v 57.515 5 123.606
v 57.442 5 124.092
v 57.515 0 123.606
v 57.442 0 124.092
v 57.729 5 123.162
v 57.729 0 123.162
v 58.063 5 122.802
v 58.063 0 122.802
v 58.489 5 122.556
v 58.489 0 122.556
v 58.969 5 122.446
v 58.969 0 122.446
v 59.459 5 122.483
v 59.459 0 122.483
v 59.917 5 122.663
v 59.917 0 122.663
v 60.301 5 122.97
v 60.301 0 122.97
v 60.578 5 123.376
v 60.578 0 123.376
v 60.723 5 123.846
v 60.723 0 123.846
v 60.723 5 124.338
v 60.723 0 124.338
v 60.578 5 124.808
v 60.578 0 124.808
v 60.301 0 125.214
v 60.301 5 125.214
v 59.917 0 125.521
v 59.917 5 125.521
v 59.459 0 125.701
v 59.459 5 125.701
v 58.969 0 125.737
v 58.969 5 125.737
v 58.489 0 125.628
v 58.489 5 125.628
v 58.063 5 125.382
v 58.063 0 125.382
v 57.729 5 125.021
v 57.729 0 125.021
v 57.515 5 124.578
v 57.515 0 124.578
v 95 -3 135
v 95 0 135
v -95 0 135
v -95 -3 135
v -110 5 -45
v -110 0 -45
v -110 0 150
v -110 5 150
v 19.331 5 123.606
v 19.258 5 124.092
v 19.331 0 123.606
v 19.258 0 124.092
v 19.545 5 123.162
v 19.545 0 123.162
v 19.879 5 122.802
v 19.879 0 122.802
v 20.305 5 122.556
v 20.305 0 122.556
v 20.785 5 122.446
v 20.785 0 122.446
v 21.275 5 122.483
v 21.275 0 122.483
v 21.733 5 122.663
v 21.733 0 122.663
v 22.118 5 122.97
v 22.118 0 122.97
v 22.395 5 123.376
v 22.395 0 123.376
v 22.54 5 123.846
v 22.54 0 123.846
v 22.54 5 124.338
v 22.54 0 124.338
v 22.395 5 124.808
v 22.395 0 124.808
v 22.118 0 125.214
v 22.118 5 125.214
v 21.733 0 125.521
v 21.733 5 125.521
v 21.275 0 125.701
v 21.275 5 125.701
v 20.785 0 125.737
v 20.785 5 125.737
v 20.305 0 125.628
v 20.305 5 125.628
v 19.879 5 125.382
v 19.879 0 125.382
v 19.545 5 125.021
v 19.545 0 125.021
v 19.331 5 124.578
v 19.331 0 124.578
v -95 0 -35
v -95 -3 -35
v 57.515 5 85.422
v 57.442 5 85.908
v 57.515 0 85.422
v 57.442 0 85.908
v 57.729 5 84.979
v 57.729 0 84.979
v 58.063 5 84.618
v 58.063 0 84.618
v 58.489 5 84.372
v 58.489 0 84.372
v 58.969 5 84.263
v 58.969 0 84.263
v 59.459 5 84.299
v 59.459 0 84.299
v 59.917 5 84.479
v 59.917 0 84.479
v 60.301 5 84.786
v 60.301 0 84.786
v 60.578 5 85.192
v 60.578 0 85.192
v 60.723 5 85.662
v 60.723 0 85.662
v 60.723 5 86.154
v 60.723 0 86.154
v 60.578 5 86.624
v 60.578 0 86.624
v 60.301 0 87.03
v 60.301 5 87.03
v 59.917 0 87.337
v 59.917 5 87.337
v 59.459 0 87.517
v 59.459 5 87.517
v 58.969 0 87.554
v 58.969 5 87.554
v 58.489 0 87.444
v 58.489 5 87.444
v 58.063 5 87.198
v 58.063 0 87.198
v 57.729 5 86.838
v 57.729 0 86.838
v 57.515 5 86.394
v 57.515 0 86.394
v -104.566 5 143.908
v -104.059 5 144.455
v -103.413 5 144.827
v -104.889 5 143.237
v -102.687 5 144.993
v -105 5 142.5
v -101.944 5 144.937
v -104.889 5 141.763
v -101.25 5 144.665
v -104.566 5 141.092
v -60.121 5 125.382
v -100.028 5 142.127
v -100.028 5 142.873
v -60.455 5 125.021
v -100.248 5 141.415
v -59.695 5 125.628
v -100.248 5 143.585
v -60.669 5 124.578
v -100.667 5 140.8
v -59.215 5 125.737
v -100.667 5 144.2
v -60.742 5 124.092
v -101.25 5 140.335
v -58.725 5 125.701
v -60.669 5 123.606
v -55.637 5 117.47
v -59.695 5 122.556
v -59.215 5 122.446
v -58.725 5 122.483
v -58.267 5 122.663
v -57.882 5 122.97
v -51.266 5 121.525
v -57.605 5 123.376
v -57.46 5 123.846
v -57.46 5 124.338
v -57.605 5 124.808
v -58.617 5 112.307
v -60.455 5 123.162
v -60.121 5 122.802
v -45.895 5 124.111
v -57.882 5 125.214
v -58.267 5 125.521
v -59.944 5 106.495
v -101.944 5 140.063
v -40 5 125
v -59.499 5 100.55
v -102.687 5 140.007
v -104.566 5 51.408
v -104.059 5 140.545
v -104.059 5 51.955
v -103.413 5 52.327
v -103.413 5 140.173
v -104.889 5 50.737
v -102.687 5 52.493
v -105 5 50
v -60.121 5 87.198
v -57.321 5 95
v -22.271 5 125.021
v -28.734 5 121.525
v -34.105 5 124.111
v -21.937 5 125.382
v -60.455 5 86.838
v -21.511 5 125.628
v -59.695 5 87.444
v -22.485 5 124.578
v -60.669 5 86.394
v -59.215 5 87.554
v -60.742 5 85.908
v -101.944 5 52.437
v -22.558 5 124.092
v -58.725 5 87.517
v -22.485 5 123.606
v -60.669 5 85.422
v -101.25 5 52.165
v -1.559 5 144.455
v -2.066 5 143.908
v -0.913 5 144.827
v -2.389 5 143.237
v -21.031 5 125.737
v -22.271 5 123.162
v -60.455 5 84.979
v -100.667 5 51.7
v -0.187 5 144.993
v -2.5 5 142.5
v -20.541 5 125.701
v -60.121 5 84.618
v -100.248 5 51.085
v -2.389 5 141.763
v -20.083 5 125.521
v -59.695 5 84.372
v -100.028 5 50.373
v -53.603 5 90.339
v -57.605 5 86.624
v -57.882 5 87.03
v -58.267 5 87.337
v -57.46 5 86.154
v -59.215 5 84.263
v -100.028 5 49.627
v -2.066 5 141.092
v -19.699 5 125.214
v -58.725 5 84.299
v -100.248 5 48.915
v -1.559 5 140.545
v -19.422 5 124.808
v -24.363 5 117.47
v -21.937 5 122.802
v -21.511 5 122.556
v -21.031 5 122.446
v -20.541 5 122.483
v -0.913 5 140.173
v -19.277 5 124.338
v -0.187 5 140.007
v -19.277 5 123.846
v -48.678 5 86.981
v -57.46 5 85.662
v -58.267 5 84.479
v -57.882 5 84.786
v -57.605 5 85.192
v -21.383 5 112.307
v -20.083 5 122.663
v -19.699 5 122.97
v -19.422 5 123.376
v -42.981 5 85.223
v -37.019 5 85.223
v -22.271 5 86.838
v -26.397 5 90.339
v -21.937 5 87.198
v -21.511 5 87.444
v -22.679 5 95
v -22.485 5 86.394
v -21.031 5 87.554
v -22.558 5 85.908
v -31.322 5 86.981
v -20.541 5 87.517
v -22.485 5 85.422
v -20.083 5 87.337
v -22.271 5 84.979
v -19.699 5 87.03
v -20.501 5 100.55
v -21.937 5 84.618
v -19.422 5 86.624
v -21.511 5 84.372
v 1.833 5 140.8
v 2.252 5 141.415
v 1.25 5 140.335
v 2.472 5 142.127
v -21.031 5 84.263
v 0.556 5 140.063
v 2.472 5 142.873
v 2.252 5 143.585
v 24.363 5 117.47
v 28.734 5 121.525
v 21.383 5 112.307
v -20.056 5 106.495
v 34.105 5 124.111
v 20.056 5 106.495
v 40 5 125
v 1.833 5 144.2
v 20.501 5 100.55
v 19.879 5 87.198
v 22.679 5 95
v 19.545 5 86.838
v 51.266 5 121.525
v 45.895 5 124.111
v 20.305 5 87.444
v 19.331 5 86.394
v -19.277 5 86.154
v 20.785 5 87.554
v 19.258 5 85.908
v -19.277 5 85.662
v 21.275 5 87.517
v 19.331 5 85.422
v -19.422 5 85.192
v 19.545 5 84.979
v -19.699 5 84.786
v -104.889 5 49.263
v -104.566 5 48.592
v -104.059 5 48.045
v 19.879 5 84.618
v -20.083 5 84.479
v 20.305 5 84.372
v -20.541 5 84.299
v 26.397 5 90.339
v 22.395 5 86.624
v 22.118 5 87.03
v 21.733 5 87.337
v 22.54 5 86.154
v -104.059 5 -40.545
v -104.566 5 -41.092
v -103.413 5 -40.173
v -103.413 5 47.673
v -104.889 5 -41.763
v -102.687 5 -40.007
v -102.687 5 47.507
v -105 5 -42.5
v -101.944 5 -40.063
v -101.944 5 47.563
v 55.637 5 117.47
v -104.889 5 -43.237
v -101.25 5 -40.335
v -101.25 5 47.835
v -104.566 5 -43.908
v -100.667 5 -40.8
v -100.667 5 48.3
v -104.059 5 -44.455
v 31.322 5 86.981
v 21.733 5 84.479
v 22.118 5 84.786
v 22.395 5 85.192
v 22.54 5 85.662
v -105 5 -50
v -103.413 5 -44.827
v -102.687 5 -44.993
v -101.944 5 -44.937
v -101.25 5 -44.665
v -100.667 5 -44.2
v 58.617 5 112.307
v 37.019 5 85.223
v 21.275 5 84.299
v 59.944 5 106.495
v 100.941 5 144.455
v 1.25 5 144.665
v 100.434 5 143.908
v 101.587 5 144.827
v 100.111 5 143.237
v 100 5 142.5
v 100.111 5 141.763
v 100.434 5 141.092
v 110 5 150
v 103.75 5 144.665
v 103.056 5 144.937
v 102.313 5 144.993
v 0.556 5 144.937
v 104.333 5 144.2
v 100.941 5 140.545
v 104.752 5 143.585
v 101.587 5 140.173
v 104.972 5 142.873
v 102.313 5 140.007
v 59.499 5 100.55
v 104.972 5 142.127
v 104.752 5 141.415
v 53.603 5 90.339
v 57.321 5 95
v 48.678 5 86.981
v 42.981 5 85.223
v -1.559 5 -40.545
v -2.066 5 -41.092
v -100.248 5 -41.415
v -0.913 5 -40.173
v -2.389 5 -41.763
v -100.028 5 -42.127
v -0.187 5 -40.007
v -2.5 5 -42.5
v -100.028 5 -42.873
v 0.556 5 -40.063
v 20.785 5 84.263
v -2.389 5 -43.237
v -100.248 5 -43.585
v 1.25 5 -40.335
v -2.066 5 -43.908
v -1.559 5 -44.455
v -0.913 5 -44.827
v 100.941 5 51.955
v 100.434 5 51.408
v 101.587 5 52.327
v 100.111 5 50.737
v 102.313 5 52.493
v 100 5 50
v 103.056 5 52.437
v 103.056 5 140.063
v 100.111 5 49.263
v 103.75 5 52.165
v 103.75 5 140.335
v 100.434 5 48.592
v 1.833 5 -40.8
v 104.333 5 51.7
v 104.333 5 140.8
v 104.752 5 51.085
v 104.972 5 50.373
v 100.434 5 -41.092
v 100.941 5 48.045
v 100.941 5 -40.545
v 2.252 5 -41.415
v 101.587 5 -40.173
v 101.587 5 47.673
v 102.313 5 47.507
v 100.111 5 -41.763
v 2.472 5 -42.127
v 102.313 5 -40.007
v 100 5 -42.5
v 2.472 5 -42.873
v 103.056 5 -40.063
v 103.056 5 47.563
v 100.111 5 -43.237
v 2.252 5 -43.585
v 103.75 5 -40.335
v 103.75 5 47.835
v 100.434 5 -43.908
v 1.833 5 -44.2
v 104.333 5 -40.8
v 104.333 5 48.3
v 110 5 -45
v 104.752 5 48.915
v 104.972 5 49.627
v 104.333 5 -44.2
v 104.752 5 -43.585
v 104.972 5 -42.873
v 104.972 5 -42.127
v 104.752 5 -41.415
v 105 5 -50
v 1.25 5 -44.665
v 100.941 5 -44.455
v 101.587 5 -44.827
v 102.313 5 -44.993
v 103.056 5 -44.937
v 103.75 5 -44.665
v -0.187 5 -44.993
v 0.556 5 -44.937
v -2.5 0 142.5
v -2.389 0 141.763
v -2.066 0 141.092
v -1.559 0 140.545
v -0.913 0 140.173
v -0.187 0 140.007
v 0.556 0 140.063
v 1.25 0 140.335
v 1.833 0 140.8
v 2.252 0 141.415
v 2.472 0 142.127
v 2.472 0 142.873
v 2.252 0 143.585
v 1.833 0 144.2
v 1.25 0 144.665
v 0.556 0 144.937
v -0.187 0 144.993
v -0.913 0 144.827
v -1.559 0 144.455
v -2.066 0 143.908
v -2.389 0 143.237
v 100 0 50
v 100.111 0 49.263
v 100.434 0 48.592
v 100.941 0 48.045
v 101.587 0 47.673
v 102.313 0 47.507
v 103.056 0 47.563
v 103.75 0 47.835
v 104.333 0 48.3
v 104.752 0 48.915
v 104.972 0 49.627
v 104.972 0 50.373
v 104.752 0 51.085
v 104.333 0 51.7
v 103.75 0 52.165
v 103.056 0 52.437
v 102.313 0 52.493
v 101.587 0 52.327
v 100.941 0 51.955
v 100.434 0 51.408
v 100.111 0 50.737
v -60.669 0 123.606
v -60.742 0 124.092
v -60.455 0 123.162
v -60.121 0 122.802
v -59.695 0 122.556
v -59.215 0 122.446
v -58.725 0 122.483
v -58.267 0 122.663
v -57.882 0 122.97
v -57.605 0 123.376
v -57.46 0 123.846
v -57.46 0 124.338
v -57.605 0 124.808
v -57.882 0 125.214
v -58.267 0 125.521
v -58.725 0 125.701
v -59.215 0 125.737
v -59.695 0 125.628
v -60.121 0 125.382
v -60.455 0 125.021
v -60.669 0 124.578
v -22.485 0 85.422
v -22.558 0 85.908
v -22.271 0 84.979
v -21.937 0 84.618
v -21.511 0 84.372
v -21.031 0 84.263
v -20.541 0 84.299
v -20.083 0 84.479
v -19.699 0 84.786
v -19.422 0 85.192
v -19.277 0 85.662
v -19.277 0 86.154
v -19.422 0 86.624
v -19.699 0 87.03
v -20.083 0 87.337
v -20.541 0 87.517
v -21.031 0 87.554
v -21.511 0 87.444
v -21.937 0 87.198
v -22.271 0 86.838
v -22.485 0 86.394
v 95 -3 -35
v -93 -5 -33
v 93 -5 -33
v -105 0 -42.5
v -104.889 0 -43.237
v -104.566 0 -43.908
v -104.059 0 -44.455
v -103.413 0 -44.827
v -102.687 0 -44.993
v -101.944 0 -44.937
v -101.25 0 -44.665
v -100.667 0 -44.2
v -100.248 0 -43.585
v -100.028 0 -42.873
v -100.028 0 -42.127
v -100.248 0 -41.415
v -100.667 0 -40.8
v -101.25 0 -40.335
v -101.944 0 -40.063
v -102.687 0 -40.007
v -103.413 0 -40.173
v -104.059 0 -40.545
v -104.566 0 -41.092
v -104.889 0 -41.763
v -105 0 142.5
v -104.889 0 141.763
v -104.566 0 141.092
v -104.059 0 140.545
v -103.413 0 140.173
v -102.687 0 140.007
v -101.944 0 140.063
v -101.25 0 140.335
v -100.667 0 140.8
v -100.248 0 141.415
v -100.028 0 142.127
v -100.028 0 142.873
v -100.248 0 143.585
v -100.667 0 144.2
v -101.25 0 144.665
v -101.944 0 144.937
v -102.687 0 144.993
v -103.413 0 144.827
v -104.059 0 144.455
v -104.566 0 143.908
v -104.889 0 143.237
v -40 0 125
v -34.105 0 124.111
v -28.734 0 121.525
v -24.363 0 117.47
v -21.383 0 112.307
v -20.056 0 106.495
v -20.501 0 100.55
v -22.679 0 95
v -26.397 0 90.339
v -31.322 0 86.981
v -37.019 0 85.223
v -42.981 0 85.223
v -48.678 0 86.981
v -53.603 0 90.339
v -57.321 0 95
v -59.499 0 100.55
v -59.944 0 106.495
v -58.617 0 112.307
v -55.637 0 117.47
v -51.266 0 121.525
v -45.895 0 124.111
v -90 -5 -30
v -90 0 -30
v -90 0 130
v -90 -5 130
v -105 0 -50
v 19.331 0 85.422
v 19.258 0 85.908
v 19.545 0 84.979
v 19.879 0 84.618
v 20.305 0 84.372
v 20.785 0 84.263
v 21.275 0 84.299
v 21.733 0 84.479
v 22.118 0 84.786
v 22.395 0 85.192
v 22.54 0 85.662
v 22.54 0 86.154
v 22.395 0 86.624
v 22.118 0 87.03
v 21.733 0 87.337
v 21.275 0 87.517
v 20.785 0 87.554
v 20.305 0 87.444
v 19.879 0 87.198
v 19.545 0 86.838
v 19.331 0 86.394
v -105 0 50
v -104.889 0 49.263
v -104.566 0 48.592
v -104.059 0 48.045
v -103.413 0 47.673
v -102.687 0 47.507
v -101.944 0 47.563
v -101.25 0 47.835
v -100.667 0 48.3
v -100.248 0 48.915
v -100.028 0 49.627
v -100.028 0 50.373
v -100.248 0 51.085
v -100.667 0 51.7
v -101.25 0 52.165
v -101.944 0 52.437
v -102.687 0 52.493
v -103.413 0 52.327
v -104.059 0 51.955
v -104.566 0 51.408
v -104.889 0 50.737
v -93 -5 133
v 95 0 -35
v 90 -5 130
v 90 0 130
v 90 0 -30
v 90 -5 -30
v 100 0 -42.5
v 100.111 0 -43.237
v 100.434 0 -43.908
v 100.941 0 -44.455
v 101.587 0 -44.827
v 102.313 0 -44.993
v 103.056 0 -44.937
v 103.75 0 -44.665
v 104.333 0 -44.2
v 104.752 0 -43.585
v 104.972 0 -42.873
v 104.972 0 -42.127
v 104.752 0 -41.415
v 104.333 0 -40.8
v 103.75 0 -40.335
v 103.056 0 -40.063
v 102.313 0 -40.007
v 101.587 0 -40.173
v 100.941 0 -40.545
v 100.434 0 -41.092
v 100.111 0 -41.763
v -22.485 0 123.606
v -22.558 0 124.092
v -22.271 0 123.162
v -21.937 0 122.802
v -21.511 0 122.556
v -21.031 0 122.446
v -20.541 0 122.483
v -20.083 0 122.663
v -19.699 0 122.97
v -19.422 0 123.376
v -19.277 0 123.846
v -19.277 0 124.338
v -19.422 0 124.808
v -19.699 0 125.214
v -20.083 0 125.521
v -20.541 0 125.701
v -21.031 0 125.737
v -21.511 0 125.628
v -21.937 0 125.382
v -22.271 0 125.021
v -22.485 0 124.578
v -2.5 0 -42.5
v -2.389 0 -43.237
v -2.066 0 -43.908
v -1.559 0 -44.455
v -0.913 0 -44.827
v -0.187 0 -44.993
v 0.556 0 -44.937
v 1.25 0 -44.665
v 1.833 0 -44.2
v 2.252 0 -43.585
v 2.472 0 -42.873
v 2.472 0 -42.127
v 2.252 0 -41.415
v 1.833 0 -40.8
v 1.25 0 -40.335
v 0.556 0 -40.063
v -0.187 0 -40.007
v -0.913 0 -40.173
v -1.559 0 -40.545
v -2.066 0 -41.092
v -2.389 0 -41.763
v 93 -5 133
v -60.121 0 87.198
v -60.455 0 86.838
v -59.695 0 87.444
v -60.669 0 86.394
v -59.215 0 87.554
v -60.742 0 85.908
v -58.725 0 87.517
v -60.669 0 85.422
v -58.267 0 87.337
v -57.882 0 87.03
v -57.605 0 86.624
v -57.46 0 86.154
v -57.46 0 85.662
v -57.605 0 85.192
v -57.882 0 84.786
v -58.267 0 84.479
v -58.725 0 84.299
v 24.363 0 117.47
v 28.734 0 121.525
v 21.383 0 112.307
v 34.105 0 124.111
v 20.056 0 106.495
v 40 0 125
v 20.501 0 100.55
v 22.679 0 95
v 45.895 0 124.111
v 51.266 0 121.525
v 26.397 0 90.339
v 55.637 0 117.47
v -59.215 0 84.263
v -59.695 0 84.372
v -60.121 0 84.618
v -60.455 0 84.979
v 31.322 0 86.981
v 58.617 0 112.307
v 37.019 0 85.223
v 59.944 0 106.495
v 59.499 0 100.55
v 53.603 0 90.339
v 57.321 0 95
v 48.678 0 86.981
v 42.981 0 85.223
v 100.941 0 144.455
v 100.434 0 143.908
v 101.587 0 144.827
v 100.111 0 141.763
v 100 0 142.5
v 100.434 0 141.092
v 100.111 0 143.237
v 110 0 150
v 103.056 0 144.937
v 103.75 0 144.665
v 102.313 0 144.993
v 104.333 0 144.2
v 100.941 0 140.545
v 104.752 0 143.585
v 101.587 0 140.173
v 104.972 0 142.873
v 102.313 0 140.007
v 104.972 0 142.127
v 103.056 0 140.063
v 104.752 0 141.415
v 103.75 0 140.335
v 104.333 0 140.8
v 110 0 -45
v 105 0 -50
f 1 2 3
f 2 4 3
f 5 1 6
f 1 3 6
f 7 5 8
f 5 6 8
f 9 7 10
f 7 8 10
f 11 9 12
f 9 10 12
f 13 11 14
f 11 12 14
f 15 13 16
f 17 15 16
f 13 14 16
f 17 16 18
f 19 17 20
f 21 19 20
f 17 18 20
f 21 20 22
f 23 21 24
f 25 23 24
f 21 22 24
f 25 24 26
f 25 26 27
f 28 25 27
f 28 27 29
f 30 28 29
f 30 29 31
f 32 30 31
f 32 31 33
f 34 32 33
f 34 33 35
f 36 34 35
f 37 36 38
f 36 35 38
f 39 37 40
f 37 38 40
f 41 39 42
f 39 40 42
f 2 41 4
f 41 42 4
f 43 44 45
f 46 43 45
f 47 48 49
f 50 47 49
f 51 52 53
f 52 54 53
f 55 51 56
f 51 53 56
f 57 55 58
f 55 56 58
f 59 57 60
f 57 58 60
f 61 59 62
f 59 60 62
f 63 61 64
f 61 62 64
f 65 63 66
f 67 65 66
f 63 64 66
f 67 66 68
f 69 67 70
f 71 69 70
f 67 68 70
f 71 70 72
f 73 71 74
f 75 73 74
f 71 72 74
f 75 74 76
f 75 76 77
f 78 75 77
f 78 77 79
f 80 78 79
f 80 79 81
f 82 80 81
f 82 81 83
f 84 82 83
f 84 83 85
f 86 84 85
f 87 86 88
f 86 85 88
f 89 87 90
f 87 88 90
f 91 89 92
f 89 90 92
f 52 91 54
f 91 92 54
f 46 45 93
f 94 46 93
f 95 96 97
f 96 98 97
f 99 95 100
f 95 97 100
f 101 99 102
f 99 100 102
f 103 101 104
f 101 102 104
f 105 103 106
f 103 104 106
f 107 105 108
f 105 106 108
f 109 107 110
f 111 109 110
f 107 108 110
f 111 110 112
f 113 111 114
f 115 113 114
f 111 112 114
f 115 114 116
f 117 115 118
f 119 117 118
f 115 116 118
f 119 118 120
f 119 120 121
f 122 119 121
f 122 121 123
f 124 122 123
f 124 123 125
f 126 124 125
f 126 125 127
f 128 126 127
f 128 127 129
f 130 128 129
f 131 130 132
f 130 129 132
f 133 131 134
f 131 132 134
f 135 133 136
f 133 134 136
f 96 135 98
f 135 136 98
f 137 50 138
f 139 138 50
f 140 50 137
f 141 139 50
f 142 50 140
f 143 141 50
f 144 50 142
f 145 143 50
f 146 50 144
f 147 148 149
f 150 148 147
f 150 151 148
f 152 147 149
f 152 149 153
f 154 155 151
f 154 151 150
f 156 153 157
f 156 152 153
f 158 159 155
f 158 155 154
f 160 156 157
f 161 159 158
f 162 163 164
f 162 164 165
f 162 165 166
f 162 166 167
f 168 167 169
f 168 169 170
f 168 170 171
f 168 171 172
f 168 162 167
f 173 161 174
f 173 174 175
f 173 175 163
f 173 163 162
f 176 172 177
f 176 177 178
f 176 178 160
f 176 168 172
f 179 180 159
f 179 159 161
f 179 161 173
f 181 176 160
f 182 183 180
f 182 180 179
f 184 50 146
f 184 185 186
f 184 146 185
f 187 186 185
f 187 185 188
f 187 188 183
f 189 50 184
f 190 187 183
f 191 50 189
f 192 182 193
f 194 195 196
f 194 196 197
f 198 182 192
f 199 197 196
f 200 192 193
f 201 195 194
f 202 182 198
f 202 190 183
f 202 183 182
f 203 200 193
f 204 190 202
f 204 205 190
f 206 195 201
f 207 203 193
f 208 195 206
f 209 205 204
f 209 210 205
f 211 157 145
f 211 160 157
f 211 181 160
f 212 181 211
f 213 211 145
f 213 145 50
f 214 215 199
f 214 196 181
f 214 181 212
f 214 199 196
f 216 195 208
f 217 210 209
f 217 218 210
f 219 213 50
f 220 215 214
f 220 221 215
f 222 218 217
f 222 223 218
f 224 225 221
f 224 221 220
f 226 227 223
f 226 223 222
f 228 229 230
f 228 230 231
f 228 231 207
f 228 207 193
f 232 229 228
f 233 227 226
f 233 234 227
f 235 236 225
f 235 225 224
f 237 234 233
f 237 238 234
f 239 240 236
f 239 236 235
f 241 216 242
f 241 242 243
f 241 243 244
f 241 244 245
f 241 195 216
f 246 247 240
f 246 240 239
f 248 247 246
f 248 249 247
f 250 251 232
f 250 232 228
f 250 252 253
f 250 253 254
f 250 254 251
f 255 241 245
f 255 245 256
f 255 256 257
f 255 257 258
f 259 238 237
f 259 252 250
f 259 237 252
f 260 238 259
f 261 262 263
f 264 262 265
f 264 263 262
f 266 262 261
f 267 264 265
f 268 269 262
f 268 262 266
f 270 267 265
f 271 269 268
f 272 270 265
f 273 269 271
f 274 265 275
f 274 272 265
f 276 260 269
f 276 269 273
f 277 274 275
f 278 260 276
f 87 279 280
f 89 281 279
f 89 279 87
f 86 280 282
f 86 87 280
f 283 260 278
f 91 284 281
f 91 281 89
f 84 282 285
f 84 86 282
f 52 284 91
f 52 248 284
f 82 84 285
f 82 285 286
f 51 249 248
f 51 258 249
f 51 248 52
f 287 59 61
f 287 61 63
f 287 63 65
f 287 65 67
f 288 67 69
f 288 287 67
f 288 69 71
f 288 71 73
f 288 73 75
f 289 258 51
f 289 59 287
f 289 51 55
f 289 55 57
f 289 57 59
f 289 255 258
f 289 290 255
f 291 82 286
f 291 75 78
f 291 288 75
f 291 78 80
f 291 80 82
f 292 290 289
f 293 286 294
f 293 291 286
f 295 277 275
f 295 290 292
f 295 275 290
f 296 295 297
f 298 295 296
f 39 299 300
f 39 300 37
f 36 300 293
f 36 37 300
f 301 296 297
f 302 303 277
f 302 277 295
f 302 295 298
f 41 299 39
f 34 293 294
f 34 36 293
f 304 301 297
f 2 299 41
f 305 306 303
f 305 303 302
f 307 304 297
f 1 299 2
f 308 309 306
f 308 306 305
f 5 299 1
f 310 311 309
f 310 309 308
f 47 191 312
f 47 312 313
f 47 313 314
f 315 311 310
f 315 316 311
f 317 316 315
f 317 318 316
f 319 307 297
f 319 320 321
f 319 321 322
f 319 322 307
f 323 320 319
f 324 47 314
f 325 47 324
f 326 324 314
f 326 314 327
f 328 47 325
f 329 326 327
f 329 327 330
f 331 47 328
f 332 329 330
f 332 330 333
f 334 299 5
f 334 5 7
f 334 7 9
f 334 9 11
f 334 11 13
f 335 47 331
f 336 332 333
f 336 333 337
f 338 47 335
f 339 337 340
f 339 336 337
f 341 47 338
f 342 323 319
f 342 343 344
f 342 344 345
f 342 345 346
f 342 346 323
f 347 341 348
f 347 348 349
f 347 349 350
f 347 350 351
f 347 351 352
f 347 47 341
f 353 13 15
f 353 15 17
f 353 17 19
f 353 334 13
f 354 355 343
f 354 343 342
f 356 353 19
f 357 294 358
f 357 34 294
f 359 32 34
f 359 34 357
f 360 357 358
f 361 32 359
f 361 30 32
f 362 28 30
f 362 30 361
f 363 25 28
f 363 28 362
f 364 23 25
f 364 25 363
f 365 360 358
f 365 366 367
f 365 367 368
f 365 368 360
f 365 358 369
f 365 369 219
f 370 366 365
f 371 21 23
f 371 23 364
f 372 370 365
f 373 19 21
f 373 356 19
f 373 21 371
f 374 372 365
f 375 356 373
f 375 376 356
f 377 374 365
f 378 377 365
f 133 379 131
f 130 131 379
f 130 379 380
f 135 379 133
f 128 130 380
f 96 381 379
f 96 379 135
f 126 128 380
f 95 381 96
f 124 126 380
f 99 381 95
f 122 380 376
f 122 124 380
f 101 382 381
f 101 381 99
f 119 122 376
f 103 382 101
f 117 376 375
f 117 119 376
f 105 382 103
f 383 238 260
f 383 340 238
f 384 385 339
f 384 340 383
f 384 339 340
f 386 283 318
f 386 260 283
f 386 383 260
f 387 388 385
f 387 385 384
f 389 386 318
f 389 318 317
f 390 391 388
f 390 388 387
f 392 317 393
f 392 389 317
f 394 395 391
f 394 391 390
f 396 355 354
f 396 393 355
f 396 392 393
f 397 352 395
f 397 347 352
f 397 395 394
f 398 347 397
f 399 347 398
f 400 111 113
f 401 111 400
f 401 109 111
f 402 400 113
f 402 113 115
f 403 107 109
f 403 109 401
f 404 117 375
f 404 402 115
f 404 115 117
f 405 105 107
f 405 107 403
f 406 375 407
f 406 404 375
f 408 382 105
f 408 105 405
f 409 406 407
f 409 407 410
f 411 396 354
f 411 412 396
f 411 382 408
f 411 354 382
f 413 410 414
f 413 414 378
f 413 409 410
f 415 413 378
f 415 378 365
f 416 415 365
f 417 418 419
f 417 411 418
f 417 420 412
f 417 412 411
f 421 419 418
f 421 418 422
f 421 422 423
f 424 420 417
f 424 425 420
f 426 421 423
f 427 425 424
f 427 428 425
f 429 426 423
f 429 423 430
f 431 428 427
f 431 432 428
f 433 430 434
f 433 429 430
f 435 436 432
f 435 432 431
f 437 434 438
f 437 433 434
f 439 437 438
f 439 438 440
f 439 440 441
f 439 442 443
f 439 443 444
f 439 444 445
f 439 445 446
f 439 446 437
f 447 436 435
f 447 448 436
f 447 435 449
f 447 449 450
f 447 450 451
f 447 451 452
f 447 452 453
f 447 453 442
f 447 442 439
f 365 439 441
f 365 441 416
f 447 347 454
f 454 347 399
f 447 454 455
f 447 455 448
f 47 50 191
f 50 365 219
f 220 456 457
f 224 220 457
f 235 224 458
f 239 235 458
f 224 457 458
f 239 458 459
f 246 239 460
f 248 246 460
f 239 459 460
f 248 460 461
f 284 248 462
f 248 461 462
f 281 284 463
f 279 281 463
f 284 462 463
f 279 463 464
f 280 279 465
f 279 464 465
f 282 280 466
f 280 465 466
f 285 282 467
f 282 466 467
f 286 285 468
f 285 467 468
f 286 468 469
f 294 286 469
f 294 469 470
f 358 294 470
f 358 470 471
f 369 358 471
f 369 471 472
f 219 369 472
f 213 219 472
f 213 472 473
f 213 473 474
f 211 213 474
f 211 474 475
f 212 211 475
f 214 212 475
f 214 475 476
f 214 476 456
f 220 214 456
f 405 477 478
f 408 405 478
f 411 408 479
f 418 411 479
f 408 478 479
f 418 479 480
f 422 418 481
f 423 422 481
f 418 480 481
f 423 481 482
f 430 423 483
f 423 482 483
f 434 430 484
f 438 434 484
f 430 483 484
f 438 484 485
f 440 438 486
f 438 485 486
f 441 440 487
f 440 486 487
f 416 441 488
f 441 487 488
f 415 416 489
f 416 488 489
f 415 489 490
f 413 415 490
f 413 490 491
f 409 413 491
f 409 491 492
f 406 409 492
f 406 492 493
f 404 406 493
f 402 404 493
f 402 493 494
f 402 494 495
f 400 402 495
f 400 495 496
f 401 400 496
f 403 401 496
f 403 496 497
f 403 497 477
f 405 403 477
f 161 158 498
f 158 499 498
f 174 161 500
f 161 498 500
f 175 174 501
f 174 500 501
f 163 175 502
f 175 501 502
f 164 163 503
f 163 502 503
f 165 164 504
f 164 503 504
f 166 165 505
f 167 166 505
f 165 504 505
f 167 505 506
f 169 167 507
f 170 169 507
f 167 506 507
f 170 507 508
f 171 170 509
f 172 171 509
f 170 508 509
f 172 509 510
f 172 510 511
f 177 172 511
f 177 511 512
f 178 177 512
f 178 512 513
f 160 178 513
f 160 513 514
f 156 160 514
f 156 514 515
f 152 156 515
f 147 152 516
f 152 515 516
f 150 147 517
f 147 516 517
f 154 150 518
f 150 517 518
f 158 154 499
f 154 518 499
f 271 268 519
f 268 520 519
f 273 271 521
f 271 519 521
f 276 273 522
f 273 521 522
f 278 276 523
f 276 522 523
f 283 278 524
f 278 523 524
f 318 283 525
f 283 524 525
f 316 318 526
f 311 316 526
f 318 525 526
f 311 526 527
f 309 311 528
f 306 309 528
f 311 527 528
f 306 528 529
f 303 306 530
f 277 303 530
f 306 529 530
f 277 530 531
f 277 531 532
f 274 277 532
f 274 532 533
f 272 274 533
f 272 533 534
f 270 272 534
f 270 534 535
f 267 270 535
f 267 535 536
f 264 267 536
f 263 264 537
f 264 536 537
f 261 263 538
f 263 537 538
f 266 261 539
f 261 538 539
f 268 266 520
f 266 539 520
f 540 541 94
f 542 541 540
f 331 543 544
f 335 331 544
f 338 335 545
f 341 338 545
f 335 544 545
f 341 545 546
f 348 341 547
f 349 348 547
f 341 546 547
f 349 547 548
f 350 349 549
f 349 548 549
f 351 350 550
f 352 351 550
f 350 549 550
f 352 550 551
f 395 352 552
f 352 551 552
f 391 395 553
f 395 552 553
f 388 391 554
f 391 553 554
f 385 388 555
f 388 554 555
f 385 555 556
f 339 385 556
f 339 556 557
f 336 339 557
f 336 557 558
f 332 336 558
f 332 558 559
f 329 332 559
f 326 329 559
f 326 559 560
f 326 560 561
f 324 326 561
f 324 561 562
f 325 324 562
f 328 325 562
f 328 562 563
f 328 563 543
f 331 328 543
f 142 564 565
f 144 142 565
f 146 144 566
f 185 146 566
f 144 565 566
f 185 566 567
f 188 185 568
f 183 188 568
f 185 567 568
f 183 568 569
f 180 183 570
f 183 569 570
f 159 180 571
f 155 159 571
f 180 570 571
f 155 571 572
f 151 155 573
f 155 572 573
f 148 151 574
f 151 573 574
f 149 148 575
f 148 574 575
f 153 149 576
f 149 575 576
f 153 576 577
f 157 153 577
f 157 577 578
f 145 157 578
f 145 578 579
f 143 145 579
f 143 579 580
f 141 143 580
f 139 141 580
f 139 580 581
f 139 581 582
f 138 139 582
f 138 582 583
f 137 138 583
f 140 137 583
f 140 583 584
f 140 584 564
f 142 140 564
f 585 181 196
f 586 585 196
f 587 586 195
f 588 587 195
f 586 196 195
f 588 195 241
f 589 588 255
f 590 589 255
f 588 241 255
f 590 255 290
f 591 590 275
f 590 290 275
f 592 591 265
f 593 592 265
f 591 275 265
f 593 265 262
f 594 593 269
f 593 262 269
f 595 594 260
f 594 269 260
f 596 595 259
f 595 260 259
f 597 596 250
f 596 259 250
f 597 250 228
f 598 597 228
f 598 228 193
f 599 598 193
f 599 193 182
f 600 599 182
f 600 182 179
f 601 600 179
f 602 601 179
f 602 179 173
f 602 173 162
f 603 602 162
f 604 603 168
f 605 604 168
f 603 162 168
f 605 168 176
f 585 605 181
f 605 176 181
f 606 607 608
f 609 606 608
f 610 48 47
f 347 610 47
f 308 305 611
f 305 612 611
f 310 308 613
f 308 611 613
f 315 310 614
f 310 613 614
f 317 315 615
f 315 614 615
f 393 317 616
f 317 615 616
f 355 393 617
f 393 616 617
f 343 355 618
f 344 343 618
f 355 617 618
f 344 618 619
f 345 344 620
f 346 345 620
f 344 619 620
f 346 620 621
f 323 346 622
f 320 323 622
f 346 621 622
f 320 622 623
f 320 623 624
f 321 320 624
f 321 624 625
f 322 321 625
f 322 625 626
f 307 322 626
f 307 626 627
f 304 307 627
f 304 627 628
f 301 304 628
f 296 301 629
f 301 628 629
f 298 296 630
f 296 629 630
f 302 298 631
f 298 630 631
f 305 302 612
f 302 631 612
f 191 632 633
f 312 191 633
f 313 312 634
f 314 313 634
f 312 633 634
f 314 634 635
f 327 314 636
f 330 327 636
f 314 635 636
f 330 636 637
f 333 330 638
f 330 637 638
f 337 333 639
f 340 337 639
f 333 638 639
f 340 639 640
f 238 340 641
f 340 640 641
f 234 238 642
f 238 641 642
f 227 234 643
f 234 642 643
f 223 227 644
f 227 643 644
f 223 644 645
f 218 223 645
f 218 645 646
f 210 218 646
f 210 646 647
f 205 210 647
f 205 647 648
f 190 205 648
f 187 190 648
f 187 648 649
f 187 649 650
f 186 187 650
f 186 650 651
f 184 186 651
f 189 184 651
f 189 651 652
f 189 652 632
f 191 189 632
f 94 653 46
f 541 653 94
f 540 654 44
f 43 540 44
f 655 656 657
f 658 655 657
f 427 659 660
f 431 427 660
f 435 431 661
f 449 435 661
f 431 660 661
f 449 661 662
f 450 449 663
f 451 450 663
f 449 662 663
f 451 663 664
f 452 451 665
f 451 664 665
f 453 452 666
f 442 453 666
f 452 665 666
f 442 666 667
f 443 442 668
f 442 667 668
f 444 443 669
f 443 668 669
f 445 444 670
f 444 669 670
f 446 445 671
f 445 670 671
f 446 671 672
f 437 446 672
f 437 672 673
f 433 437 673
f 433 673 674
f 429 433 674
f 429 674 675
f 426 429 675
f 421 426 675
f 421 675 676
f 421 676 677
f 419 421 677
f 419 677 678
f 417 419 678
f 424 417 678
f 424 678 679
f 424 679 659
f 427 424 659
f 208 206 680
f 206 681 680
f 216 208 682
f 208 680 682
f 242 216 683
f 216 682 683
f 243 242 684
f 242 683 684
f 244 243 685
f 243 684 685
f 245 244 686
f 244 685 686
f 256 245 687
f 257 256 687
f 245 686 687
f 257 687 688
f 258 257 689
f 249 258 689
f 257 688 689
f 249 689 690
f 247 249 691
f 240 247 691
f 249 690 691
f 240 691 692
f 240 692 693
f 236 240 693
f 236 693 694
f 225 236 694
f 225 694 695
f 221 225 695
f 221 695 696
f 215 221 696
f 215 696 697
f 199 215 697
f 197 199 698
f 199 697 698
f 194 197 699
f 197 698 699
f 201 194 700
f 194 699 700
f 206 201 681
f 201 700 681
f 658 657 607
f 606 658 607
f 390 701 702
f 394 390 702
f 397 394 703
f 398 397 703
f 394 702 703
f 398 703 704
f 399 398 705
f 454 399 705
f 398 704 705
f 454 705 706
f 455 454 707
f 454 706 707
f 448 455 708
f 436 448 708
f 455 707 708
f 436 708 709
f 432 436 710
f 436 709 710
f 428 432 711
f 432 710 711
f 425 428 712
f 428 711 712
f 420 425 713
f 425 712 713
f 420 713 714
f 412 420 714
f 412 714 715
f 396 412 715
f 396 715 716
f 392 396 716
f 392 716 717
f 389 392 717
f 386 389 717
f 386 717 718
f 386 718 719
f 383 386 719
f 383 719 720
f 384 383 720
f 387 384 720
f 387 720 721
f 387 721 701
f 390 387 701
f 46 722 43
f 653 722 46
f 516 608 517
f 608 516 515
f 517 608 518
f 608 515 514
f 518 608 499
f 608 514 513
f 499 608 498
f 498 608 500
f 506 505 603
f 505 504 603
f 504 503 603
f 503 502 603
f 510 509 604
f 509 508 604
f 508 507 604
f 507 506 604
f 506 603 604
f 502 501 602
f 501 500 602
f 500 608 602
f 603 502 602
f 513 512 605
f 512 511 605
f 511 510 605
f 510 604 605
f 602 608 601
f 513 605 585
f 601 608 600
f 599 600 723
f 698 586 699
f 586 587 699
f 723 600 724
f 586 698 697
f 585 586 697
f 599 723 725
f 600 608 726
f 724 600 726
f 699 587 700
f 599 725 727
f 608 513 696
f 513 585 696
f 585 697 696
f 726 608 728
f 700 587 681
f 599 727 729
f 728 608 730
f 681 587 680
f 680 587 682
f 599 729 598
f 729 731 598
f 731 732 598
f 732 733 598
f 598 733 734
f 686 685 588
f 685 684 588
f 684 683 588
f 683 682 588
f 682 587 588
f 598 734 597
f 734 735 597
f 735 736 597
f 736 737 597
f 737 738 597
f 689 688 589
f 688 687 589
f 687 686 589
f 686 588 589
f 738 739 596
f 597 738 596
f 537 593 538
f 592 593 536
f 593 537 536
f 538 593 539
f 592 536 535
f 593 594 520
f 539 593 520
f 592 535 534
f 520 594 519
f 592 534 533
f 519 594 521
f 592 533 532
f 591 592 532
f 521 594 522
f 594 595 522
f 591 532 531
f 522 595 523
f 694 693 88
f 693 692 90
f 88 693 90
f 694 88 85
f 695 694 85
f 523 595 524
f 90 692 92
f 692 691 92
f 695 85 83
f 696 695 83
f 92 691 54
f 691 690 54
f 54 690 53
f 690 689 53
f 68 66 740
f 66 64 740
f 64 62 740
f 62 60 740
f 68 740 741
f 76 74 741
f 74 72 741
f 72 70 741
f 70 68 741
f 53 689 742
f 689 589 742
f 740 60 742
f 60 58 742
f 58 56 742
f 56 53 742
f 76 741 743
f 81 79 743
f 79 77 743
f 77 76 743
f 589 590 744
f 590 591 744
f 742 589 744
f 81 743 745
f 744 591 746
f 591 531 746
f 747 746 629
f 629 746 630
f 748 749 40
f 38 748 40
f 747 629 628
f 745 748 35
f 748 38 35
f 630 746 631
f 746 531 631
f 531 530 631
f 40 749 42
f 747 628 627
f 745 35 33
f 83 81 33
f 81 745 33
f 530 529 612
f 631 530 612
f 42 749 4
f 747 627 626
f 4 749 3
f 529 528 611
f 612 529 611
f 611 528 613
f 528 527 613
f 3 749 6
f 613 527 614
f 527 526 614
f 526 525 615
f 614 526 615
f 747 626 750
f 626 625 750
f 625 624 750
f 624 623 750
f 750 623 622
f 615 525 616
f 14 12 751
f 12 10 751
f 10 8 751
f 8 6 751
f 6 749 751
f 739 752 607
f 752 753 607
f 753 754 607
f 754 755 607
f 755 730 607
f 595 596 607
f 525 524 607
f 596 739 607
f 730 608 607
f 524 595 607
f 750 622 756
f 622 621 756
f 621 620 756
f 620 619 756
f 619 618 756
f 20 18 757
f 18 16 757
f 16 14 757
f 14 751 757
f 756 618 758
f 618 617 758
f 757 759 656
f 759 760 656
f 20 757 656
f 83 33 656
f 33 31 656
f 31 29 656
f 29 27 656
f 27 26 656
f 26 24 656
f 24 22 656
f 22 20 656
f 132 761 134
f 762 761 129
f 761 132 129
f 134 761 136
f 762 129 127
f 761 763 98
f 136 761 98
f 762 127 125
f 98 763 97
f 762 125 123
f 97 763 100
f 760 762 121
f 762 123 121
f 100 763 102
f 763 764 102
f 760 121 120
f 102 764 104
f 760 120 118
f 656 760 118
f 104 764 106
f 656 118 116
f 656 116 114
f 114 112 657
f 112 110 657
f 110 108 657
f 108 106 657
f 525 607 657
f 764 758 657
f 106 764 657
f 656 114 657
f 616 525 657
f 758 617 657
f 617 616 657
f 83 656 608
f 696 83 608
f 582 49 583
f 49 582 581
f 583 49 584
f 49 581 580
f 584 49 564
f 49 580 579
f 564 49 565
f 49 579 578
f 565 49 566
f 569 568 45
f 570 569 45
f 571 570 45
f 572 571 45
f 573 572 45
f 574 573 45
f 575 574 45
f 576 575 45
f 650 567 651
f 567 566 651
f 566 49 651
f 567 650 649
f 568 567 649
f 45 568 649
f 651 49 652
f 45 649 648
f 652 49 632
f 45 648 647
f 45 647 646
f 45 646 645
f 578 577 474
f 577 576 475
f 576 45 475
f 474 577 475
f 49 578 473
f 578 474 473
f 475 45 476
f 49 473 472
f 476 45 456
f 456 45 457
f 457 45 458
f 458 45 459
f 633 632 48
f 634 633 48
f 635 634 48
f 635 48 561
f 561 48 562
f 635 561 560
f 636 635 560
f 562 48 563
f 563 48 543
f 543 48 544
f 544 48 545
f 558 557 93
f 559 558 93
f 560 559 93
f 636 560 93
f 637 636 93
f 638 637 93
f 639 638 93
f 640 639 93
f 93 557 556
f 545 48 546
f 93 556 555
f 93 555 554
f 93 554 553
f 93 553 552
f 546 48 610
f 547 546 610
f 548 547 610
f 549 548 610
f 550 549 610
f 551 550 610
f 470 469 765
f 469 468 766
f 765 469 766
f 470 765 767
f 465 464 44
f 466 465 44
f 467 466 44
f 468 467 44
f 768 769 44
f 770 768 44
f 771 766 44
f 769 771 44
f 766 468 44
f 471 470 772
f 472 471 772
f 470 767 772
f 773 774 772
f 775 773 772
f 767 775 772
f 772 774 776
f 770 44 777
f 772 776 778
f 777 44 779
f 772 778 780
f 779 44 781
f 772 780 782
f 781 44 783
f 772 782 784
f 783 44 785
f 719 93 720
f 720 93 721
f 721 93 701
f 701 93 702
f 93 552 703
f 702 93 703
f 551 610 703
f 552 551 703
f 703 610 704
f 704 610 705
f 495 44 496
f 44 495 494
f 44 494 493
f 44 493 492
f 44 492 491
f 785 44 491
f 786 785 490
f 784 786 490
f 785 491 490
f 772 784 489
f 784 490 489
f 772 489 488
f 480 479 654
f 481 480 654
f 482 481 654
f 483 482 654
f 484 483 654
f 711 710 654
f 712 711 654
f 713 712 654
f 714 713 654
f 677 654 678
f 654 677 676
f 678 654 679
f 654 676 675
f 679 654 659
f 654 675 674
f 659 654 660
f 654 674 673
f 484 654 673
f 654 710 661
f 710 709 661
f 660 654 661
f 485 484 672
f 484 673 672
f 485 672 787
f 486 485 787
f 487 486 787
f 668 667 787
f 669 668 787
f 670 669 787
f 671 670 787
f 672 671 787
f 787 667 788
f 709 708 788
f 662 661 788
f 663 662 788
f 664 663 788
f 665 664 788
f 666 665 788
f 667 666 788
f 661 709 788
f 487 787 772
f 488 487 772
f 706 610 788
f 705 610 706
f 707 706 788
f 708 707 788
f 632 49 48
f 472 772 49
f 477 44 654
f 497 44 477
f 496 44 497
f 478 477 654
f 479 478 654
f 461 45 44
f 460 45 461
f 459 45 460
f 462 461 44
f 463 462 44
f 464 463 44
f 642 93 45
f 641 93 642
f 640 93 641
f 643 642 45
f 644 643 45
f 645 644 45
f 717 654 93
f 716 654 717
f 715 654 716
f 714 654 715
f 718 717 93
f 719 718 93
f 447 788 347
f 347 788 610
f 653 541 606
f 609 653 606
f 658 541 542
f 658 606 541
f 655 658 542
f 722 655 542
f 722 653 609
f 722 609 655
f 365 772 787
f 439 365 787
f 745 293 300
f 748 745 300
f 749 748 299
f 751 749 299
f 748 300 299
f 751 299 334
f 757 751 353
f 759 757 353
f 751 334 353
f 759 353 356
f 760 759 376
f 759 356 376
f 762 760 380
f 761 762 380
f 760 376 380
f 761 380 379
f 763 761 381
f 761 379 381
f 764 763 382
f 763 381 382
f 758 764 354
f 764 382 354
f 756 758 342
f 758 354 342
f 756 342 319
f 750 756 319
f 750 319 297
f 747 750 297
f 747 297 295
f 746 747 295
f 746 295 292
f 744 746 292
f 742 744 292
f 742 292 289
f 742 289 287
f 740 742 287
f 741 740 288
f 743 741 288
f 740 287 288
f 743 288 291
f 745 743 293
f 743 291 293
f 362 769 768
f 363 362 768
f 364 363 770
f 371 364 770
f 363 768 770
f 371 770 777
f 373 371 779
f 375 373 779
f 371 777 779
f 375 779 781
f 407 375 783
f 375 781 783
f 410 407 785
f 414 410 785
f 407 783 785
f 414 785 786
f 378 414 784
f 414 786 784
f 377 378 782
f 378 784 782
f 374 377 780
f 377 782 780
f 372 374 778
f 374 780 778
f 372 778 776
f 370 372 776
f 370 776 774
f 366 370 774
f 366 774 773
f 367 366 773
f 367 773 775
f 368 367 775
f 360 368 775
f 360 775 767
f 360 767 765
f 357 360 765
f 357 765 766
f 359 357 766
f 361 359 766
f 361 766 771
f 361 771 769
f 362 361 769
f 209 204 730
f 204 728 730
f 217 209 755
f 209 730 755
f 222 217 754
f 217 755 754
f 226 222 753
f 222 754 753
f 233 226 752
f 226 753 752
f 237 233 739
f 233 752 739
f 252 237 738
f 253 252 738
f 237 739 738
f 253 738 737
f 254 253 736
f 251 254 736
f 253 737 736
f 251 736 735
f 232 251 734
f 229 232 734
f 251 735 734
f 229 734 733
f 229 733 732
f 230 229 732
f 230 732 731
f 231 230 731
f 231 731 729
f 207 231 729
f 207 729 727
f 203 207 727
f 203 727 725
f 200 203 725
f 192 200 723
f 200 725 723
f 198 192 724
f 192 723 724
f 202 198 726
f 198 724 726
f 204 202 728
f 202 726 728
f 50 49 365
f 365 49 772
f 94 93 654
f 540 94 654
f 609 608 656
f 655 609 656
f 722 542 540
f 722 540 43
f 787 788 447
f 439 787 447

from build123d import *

# Parameters (mm, degrees)
BOSS_EXTRUDE1_DEPTH   = 5
CHAMFER1_SIZE         = 5
BOSS_EXTRUDE5_DEPTH   = 5
CHAMFER2_SIZE         = 2
SKETCH9_R             = 20
CUT_EXTRUDE4_DEPTH    = 5
M6_TAPPED_HOLE1_D     = 5
M4_TAPPED_HOLE1_D     = 3.3
M4_TAPPED_HOLE1_DEPTH = 5
M4_TAPPED_HOLE1_TIP   = 0.991420021


with BuildPart() as part:
    # Sketch1 → Boss-Extrude1 (new body)
    with BuildSketch(Plane(origin=(0, 0, 0), x_dir=(1, 0, 0), z_dir=(0, 1, 0))):
        Polygon((-110, -150), (110, -150), (110, 50), (-102.5, 50), (-110, 50), align=None)
    extrude(amount=BOSS_EXTRUDE1_DEPTH)

    # Chamfer1
    chamfer1_edges = [part.edges().sort_by_distance(p)[0] for p in [
        (110, 2.5, -50),
        (-110, 2.5, -50),
    ]]
    chamfer(chamfer1_edges, length=CHAMFER1_SIZE)

    # Sketch4 → Boss-Extrude5 (add)
    with BuildSketch(Plane.XZ):
        Polygon((95, 135), (0, 135), (-95, 135), (-95, -35), (95, -35), align=None)
        Polygon((-90, 130), (0, 130), (90, 130), (90, -30), (-90, -30), align=None, mode=Mode.SUBTRACT)
    extrude(amount=BOSS_EXTRUDE5_DEPTH)

    # Chamfer2
    chamfer2_edges = [part.edges().sort_by_distance(p)[0] for p in [
        (0, -5, 135),
        (-95, -5, 50),
        (0, -5, -35),
        (95, -5, 50),
    ]]
    chamfer(chamfer2_edges, length=CHAMFER2_SIZE)

    # Sketch9 → Cut-Extrude4 (cut)
    with BuildSketch(Plane(origin=(0, 5, 0), x_dir=(1, 0, 0), z_dir=(0, 1, 0))):
        with Locations(Location((40, -105, 0), (0, 0, 270))):
            Circle(SKETCH9_R)
        with Locations(Location((-40, -105, 0), (0, 0, 270))):
            Circle(SKETCH9_R)
    extrude(amount=-CUT_EXTRUDE4_DEPTH, mode=Mode.SUBTRACT)

    # M6 Tapped Hole1 (through all)
    with Locations(Plane(origin=(0, 5, 0), x_dir=(1, 0, 0), z_dir=(0, 1, 0))):
        with Locations((-102.5, 42.5), (0, 42.5), (102.5, 42.5), (102.5, -50), (-102.5, -50), (-102.5, -142.5), (0, -142.5), (102.5, -142.5)):
            Hole(M6_TAPPED_HOLE1_D / 2)

    # M4 Tapped Hole1
    with Locations(Plane(origin=(0, 5, 0), x_dir=(1, 0, 0), z_dir=(0, 1, 0))):
        with Locations((-59.091883092, -85.908116908), (-20.908116908, -85.908116908), (-20.908116908, -124.091883092), (-59.091883092, -124.091883092), (20.908116908, -85.908116908), (59.091883092, -85.908116908), (59.091883092, -124.091883092), (20.908116908, -124.091883092)):
            Hole(M4_TAPPED_HOLE1_D / 2, depth=M4_TAPPED_HOLE1_DEPTH)
            with Locations((0, 0, -(M4_TAPPED_HOLE1_DEPTH + M4_TAPPED_HOLE1_TIP / 2))):  # 118° drill point
                Cone(0, M4_TAPPED_HOLE1_D / 2, M4_TAPPED_HOLE1_TIP, mode=Mode.SUBTRACT)


solid = part.part
